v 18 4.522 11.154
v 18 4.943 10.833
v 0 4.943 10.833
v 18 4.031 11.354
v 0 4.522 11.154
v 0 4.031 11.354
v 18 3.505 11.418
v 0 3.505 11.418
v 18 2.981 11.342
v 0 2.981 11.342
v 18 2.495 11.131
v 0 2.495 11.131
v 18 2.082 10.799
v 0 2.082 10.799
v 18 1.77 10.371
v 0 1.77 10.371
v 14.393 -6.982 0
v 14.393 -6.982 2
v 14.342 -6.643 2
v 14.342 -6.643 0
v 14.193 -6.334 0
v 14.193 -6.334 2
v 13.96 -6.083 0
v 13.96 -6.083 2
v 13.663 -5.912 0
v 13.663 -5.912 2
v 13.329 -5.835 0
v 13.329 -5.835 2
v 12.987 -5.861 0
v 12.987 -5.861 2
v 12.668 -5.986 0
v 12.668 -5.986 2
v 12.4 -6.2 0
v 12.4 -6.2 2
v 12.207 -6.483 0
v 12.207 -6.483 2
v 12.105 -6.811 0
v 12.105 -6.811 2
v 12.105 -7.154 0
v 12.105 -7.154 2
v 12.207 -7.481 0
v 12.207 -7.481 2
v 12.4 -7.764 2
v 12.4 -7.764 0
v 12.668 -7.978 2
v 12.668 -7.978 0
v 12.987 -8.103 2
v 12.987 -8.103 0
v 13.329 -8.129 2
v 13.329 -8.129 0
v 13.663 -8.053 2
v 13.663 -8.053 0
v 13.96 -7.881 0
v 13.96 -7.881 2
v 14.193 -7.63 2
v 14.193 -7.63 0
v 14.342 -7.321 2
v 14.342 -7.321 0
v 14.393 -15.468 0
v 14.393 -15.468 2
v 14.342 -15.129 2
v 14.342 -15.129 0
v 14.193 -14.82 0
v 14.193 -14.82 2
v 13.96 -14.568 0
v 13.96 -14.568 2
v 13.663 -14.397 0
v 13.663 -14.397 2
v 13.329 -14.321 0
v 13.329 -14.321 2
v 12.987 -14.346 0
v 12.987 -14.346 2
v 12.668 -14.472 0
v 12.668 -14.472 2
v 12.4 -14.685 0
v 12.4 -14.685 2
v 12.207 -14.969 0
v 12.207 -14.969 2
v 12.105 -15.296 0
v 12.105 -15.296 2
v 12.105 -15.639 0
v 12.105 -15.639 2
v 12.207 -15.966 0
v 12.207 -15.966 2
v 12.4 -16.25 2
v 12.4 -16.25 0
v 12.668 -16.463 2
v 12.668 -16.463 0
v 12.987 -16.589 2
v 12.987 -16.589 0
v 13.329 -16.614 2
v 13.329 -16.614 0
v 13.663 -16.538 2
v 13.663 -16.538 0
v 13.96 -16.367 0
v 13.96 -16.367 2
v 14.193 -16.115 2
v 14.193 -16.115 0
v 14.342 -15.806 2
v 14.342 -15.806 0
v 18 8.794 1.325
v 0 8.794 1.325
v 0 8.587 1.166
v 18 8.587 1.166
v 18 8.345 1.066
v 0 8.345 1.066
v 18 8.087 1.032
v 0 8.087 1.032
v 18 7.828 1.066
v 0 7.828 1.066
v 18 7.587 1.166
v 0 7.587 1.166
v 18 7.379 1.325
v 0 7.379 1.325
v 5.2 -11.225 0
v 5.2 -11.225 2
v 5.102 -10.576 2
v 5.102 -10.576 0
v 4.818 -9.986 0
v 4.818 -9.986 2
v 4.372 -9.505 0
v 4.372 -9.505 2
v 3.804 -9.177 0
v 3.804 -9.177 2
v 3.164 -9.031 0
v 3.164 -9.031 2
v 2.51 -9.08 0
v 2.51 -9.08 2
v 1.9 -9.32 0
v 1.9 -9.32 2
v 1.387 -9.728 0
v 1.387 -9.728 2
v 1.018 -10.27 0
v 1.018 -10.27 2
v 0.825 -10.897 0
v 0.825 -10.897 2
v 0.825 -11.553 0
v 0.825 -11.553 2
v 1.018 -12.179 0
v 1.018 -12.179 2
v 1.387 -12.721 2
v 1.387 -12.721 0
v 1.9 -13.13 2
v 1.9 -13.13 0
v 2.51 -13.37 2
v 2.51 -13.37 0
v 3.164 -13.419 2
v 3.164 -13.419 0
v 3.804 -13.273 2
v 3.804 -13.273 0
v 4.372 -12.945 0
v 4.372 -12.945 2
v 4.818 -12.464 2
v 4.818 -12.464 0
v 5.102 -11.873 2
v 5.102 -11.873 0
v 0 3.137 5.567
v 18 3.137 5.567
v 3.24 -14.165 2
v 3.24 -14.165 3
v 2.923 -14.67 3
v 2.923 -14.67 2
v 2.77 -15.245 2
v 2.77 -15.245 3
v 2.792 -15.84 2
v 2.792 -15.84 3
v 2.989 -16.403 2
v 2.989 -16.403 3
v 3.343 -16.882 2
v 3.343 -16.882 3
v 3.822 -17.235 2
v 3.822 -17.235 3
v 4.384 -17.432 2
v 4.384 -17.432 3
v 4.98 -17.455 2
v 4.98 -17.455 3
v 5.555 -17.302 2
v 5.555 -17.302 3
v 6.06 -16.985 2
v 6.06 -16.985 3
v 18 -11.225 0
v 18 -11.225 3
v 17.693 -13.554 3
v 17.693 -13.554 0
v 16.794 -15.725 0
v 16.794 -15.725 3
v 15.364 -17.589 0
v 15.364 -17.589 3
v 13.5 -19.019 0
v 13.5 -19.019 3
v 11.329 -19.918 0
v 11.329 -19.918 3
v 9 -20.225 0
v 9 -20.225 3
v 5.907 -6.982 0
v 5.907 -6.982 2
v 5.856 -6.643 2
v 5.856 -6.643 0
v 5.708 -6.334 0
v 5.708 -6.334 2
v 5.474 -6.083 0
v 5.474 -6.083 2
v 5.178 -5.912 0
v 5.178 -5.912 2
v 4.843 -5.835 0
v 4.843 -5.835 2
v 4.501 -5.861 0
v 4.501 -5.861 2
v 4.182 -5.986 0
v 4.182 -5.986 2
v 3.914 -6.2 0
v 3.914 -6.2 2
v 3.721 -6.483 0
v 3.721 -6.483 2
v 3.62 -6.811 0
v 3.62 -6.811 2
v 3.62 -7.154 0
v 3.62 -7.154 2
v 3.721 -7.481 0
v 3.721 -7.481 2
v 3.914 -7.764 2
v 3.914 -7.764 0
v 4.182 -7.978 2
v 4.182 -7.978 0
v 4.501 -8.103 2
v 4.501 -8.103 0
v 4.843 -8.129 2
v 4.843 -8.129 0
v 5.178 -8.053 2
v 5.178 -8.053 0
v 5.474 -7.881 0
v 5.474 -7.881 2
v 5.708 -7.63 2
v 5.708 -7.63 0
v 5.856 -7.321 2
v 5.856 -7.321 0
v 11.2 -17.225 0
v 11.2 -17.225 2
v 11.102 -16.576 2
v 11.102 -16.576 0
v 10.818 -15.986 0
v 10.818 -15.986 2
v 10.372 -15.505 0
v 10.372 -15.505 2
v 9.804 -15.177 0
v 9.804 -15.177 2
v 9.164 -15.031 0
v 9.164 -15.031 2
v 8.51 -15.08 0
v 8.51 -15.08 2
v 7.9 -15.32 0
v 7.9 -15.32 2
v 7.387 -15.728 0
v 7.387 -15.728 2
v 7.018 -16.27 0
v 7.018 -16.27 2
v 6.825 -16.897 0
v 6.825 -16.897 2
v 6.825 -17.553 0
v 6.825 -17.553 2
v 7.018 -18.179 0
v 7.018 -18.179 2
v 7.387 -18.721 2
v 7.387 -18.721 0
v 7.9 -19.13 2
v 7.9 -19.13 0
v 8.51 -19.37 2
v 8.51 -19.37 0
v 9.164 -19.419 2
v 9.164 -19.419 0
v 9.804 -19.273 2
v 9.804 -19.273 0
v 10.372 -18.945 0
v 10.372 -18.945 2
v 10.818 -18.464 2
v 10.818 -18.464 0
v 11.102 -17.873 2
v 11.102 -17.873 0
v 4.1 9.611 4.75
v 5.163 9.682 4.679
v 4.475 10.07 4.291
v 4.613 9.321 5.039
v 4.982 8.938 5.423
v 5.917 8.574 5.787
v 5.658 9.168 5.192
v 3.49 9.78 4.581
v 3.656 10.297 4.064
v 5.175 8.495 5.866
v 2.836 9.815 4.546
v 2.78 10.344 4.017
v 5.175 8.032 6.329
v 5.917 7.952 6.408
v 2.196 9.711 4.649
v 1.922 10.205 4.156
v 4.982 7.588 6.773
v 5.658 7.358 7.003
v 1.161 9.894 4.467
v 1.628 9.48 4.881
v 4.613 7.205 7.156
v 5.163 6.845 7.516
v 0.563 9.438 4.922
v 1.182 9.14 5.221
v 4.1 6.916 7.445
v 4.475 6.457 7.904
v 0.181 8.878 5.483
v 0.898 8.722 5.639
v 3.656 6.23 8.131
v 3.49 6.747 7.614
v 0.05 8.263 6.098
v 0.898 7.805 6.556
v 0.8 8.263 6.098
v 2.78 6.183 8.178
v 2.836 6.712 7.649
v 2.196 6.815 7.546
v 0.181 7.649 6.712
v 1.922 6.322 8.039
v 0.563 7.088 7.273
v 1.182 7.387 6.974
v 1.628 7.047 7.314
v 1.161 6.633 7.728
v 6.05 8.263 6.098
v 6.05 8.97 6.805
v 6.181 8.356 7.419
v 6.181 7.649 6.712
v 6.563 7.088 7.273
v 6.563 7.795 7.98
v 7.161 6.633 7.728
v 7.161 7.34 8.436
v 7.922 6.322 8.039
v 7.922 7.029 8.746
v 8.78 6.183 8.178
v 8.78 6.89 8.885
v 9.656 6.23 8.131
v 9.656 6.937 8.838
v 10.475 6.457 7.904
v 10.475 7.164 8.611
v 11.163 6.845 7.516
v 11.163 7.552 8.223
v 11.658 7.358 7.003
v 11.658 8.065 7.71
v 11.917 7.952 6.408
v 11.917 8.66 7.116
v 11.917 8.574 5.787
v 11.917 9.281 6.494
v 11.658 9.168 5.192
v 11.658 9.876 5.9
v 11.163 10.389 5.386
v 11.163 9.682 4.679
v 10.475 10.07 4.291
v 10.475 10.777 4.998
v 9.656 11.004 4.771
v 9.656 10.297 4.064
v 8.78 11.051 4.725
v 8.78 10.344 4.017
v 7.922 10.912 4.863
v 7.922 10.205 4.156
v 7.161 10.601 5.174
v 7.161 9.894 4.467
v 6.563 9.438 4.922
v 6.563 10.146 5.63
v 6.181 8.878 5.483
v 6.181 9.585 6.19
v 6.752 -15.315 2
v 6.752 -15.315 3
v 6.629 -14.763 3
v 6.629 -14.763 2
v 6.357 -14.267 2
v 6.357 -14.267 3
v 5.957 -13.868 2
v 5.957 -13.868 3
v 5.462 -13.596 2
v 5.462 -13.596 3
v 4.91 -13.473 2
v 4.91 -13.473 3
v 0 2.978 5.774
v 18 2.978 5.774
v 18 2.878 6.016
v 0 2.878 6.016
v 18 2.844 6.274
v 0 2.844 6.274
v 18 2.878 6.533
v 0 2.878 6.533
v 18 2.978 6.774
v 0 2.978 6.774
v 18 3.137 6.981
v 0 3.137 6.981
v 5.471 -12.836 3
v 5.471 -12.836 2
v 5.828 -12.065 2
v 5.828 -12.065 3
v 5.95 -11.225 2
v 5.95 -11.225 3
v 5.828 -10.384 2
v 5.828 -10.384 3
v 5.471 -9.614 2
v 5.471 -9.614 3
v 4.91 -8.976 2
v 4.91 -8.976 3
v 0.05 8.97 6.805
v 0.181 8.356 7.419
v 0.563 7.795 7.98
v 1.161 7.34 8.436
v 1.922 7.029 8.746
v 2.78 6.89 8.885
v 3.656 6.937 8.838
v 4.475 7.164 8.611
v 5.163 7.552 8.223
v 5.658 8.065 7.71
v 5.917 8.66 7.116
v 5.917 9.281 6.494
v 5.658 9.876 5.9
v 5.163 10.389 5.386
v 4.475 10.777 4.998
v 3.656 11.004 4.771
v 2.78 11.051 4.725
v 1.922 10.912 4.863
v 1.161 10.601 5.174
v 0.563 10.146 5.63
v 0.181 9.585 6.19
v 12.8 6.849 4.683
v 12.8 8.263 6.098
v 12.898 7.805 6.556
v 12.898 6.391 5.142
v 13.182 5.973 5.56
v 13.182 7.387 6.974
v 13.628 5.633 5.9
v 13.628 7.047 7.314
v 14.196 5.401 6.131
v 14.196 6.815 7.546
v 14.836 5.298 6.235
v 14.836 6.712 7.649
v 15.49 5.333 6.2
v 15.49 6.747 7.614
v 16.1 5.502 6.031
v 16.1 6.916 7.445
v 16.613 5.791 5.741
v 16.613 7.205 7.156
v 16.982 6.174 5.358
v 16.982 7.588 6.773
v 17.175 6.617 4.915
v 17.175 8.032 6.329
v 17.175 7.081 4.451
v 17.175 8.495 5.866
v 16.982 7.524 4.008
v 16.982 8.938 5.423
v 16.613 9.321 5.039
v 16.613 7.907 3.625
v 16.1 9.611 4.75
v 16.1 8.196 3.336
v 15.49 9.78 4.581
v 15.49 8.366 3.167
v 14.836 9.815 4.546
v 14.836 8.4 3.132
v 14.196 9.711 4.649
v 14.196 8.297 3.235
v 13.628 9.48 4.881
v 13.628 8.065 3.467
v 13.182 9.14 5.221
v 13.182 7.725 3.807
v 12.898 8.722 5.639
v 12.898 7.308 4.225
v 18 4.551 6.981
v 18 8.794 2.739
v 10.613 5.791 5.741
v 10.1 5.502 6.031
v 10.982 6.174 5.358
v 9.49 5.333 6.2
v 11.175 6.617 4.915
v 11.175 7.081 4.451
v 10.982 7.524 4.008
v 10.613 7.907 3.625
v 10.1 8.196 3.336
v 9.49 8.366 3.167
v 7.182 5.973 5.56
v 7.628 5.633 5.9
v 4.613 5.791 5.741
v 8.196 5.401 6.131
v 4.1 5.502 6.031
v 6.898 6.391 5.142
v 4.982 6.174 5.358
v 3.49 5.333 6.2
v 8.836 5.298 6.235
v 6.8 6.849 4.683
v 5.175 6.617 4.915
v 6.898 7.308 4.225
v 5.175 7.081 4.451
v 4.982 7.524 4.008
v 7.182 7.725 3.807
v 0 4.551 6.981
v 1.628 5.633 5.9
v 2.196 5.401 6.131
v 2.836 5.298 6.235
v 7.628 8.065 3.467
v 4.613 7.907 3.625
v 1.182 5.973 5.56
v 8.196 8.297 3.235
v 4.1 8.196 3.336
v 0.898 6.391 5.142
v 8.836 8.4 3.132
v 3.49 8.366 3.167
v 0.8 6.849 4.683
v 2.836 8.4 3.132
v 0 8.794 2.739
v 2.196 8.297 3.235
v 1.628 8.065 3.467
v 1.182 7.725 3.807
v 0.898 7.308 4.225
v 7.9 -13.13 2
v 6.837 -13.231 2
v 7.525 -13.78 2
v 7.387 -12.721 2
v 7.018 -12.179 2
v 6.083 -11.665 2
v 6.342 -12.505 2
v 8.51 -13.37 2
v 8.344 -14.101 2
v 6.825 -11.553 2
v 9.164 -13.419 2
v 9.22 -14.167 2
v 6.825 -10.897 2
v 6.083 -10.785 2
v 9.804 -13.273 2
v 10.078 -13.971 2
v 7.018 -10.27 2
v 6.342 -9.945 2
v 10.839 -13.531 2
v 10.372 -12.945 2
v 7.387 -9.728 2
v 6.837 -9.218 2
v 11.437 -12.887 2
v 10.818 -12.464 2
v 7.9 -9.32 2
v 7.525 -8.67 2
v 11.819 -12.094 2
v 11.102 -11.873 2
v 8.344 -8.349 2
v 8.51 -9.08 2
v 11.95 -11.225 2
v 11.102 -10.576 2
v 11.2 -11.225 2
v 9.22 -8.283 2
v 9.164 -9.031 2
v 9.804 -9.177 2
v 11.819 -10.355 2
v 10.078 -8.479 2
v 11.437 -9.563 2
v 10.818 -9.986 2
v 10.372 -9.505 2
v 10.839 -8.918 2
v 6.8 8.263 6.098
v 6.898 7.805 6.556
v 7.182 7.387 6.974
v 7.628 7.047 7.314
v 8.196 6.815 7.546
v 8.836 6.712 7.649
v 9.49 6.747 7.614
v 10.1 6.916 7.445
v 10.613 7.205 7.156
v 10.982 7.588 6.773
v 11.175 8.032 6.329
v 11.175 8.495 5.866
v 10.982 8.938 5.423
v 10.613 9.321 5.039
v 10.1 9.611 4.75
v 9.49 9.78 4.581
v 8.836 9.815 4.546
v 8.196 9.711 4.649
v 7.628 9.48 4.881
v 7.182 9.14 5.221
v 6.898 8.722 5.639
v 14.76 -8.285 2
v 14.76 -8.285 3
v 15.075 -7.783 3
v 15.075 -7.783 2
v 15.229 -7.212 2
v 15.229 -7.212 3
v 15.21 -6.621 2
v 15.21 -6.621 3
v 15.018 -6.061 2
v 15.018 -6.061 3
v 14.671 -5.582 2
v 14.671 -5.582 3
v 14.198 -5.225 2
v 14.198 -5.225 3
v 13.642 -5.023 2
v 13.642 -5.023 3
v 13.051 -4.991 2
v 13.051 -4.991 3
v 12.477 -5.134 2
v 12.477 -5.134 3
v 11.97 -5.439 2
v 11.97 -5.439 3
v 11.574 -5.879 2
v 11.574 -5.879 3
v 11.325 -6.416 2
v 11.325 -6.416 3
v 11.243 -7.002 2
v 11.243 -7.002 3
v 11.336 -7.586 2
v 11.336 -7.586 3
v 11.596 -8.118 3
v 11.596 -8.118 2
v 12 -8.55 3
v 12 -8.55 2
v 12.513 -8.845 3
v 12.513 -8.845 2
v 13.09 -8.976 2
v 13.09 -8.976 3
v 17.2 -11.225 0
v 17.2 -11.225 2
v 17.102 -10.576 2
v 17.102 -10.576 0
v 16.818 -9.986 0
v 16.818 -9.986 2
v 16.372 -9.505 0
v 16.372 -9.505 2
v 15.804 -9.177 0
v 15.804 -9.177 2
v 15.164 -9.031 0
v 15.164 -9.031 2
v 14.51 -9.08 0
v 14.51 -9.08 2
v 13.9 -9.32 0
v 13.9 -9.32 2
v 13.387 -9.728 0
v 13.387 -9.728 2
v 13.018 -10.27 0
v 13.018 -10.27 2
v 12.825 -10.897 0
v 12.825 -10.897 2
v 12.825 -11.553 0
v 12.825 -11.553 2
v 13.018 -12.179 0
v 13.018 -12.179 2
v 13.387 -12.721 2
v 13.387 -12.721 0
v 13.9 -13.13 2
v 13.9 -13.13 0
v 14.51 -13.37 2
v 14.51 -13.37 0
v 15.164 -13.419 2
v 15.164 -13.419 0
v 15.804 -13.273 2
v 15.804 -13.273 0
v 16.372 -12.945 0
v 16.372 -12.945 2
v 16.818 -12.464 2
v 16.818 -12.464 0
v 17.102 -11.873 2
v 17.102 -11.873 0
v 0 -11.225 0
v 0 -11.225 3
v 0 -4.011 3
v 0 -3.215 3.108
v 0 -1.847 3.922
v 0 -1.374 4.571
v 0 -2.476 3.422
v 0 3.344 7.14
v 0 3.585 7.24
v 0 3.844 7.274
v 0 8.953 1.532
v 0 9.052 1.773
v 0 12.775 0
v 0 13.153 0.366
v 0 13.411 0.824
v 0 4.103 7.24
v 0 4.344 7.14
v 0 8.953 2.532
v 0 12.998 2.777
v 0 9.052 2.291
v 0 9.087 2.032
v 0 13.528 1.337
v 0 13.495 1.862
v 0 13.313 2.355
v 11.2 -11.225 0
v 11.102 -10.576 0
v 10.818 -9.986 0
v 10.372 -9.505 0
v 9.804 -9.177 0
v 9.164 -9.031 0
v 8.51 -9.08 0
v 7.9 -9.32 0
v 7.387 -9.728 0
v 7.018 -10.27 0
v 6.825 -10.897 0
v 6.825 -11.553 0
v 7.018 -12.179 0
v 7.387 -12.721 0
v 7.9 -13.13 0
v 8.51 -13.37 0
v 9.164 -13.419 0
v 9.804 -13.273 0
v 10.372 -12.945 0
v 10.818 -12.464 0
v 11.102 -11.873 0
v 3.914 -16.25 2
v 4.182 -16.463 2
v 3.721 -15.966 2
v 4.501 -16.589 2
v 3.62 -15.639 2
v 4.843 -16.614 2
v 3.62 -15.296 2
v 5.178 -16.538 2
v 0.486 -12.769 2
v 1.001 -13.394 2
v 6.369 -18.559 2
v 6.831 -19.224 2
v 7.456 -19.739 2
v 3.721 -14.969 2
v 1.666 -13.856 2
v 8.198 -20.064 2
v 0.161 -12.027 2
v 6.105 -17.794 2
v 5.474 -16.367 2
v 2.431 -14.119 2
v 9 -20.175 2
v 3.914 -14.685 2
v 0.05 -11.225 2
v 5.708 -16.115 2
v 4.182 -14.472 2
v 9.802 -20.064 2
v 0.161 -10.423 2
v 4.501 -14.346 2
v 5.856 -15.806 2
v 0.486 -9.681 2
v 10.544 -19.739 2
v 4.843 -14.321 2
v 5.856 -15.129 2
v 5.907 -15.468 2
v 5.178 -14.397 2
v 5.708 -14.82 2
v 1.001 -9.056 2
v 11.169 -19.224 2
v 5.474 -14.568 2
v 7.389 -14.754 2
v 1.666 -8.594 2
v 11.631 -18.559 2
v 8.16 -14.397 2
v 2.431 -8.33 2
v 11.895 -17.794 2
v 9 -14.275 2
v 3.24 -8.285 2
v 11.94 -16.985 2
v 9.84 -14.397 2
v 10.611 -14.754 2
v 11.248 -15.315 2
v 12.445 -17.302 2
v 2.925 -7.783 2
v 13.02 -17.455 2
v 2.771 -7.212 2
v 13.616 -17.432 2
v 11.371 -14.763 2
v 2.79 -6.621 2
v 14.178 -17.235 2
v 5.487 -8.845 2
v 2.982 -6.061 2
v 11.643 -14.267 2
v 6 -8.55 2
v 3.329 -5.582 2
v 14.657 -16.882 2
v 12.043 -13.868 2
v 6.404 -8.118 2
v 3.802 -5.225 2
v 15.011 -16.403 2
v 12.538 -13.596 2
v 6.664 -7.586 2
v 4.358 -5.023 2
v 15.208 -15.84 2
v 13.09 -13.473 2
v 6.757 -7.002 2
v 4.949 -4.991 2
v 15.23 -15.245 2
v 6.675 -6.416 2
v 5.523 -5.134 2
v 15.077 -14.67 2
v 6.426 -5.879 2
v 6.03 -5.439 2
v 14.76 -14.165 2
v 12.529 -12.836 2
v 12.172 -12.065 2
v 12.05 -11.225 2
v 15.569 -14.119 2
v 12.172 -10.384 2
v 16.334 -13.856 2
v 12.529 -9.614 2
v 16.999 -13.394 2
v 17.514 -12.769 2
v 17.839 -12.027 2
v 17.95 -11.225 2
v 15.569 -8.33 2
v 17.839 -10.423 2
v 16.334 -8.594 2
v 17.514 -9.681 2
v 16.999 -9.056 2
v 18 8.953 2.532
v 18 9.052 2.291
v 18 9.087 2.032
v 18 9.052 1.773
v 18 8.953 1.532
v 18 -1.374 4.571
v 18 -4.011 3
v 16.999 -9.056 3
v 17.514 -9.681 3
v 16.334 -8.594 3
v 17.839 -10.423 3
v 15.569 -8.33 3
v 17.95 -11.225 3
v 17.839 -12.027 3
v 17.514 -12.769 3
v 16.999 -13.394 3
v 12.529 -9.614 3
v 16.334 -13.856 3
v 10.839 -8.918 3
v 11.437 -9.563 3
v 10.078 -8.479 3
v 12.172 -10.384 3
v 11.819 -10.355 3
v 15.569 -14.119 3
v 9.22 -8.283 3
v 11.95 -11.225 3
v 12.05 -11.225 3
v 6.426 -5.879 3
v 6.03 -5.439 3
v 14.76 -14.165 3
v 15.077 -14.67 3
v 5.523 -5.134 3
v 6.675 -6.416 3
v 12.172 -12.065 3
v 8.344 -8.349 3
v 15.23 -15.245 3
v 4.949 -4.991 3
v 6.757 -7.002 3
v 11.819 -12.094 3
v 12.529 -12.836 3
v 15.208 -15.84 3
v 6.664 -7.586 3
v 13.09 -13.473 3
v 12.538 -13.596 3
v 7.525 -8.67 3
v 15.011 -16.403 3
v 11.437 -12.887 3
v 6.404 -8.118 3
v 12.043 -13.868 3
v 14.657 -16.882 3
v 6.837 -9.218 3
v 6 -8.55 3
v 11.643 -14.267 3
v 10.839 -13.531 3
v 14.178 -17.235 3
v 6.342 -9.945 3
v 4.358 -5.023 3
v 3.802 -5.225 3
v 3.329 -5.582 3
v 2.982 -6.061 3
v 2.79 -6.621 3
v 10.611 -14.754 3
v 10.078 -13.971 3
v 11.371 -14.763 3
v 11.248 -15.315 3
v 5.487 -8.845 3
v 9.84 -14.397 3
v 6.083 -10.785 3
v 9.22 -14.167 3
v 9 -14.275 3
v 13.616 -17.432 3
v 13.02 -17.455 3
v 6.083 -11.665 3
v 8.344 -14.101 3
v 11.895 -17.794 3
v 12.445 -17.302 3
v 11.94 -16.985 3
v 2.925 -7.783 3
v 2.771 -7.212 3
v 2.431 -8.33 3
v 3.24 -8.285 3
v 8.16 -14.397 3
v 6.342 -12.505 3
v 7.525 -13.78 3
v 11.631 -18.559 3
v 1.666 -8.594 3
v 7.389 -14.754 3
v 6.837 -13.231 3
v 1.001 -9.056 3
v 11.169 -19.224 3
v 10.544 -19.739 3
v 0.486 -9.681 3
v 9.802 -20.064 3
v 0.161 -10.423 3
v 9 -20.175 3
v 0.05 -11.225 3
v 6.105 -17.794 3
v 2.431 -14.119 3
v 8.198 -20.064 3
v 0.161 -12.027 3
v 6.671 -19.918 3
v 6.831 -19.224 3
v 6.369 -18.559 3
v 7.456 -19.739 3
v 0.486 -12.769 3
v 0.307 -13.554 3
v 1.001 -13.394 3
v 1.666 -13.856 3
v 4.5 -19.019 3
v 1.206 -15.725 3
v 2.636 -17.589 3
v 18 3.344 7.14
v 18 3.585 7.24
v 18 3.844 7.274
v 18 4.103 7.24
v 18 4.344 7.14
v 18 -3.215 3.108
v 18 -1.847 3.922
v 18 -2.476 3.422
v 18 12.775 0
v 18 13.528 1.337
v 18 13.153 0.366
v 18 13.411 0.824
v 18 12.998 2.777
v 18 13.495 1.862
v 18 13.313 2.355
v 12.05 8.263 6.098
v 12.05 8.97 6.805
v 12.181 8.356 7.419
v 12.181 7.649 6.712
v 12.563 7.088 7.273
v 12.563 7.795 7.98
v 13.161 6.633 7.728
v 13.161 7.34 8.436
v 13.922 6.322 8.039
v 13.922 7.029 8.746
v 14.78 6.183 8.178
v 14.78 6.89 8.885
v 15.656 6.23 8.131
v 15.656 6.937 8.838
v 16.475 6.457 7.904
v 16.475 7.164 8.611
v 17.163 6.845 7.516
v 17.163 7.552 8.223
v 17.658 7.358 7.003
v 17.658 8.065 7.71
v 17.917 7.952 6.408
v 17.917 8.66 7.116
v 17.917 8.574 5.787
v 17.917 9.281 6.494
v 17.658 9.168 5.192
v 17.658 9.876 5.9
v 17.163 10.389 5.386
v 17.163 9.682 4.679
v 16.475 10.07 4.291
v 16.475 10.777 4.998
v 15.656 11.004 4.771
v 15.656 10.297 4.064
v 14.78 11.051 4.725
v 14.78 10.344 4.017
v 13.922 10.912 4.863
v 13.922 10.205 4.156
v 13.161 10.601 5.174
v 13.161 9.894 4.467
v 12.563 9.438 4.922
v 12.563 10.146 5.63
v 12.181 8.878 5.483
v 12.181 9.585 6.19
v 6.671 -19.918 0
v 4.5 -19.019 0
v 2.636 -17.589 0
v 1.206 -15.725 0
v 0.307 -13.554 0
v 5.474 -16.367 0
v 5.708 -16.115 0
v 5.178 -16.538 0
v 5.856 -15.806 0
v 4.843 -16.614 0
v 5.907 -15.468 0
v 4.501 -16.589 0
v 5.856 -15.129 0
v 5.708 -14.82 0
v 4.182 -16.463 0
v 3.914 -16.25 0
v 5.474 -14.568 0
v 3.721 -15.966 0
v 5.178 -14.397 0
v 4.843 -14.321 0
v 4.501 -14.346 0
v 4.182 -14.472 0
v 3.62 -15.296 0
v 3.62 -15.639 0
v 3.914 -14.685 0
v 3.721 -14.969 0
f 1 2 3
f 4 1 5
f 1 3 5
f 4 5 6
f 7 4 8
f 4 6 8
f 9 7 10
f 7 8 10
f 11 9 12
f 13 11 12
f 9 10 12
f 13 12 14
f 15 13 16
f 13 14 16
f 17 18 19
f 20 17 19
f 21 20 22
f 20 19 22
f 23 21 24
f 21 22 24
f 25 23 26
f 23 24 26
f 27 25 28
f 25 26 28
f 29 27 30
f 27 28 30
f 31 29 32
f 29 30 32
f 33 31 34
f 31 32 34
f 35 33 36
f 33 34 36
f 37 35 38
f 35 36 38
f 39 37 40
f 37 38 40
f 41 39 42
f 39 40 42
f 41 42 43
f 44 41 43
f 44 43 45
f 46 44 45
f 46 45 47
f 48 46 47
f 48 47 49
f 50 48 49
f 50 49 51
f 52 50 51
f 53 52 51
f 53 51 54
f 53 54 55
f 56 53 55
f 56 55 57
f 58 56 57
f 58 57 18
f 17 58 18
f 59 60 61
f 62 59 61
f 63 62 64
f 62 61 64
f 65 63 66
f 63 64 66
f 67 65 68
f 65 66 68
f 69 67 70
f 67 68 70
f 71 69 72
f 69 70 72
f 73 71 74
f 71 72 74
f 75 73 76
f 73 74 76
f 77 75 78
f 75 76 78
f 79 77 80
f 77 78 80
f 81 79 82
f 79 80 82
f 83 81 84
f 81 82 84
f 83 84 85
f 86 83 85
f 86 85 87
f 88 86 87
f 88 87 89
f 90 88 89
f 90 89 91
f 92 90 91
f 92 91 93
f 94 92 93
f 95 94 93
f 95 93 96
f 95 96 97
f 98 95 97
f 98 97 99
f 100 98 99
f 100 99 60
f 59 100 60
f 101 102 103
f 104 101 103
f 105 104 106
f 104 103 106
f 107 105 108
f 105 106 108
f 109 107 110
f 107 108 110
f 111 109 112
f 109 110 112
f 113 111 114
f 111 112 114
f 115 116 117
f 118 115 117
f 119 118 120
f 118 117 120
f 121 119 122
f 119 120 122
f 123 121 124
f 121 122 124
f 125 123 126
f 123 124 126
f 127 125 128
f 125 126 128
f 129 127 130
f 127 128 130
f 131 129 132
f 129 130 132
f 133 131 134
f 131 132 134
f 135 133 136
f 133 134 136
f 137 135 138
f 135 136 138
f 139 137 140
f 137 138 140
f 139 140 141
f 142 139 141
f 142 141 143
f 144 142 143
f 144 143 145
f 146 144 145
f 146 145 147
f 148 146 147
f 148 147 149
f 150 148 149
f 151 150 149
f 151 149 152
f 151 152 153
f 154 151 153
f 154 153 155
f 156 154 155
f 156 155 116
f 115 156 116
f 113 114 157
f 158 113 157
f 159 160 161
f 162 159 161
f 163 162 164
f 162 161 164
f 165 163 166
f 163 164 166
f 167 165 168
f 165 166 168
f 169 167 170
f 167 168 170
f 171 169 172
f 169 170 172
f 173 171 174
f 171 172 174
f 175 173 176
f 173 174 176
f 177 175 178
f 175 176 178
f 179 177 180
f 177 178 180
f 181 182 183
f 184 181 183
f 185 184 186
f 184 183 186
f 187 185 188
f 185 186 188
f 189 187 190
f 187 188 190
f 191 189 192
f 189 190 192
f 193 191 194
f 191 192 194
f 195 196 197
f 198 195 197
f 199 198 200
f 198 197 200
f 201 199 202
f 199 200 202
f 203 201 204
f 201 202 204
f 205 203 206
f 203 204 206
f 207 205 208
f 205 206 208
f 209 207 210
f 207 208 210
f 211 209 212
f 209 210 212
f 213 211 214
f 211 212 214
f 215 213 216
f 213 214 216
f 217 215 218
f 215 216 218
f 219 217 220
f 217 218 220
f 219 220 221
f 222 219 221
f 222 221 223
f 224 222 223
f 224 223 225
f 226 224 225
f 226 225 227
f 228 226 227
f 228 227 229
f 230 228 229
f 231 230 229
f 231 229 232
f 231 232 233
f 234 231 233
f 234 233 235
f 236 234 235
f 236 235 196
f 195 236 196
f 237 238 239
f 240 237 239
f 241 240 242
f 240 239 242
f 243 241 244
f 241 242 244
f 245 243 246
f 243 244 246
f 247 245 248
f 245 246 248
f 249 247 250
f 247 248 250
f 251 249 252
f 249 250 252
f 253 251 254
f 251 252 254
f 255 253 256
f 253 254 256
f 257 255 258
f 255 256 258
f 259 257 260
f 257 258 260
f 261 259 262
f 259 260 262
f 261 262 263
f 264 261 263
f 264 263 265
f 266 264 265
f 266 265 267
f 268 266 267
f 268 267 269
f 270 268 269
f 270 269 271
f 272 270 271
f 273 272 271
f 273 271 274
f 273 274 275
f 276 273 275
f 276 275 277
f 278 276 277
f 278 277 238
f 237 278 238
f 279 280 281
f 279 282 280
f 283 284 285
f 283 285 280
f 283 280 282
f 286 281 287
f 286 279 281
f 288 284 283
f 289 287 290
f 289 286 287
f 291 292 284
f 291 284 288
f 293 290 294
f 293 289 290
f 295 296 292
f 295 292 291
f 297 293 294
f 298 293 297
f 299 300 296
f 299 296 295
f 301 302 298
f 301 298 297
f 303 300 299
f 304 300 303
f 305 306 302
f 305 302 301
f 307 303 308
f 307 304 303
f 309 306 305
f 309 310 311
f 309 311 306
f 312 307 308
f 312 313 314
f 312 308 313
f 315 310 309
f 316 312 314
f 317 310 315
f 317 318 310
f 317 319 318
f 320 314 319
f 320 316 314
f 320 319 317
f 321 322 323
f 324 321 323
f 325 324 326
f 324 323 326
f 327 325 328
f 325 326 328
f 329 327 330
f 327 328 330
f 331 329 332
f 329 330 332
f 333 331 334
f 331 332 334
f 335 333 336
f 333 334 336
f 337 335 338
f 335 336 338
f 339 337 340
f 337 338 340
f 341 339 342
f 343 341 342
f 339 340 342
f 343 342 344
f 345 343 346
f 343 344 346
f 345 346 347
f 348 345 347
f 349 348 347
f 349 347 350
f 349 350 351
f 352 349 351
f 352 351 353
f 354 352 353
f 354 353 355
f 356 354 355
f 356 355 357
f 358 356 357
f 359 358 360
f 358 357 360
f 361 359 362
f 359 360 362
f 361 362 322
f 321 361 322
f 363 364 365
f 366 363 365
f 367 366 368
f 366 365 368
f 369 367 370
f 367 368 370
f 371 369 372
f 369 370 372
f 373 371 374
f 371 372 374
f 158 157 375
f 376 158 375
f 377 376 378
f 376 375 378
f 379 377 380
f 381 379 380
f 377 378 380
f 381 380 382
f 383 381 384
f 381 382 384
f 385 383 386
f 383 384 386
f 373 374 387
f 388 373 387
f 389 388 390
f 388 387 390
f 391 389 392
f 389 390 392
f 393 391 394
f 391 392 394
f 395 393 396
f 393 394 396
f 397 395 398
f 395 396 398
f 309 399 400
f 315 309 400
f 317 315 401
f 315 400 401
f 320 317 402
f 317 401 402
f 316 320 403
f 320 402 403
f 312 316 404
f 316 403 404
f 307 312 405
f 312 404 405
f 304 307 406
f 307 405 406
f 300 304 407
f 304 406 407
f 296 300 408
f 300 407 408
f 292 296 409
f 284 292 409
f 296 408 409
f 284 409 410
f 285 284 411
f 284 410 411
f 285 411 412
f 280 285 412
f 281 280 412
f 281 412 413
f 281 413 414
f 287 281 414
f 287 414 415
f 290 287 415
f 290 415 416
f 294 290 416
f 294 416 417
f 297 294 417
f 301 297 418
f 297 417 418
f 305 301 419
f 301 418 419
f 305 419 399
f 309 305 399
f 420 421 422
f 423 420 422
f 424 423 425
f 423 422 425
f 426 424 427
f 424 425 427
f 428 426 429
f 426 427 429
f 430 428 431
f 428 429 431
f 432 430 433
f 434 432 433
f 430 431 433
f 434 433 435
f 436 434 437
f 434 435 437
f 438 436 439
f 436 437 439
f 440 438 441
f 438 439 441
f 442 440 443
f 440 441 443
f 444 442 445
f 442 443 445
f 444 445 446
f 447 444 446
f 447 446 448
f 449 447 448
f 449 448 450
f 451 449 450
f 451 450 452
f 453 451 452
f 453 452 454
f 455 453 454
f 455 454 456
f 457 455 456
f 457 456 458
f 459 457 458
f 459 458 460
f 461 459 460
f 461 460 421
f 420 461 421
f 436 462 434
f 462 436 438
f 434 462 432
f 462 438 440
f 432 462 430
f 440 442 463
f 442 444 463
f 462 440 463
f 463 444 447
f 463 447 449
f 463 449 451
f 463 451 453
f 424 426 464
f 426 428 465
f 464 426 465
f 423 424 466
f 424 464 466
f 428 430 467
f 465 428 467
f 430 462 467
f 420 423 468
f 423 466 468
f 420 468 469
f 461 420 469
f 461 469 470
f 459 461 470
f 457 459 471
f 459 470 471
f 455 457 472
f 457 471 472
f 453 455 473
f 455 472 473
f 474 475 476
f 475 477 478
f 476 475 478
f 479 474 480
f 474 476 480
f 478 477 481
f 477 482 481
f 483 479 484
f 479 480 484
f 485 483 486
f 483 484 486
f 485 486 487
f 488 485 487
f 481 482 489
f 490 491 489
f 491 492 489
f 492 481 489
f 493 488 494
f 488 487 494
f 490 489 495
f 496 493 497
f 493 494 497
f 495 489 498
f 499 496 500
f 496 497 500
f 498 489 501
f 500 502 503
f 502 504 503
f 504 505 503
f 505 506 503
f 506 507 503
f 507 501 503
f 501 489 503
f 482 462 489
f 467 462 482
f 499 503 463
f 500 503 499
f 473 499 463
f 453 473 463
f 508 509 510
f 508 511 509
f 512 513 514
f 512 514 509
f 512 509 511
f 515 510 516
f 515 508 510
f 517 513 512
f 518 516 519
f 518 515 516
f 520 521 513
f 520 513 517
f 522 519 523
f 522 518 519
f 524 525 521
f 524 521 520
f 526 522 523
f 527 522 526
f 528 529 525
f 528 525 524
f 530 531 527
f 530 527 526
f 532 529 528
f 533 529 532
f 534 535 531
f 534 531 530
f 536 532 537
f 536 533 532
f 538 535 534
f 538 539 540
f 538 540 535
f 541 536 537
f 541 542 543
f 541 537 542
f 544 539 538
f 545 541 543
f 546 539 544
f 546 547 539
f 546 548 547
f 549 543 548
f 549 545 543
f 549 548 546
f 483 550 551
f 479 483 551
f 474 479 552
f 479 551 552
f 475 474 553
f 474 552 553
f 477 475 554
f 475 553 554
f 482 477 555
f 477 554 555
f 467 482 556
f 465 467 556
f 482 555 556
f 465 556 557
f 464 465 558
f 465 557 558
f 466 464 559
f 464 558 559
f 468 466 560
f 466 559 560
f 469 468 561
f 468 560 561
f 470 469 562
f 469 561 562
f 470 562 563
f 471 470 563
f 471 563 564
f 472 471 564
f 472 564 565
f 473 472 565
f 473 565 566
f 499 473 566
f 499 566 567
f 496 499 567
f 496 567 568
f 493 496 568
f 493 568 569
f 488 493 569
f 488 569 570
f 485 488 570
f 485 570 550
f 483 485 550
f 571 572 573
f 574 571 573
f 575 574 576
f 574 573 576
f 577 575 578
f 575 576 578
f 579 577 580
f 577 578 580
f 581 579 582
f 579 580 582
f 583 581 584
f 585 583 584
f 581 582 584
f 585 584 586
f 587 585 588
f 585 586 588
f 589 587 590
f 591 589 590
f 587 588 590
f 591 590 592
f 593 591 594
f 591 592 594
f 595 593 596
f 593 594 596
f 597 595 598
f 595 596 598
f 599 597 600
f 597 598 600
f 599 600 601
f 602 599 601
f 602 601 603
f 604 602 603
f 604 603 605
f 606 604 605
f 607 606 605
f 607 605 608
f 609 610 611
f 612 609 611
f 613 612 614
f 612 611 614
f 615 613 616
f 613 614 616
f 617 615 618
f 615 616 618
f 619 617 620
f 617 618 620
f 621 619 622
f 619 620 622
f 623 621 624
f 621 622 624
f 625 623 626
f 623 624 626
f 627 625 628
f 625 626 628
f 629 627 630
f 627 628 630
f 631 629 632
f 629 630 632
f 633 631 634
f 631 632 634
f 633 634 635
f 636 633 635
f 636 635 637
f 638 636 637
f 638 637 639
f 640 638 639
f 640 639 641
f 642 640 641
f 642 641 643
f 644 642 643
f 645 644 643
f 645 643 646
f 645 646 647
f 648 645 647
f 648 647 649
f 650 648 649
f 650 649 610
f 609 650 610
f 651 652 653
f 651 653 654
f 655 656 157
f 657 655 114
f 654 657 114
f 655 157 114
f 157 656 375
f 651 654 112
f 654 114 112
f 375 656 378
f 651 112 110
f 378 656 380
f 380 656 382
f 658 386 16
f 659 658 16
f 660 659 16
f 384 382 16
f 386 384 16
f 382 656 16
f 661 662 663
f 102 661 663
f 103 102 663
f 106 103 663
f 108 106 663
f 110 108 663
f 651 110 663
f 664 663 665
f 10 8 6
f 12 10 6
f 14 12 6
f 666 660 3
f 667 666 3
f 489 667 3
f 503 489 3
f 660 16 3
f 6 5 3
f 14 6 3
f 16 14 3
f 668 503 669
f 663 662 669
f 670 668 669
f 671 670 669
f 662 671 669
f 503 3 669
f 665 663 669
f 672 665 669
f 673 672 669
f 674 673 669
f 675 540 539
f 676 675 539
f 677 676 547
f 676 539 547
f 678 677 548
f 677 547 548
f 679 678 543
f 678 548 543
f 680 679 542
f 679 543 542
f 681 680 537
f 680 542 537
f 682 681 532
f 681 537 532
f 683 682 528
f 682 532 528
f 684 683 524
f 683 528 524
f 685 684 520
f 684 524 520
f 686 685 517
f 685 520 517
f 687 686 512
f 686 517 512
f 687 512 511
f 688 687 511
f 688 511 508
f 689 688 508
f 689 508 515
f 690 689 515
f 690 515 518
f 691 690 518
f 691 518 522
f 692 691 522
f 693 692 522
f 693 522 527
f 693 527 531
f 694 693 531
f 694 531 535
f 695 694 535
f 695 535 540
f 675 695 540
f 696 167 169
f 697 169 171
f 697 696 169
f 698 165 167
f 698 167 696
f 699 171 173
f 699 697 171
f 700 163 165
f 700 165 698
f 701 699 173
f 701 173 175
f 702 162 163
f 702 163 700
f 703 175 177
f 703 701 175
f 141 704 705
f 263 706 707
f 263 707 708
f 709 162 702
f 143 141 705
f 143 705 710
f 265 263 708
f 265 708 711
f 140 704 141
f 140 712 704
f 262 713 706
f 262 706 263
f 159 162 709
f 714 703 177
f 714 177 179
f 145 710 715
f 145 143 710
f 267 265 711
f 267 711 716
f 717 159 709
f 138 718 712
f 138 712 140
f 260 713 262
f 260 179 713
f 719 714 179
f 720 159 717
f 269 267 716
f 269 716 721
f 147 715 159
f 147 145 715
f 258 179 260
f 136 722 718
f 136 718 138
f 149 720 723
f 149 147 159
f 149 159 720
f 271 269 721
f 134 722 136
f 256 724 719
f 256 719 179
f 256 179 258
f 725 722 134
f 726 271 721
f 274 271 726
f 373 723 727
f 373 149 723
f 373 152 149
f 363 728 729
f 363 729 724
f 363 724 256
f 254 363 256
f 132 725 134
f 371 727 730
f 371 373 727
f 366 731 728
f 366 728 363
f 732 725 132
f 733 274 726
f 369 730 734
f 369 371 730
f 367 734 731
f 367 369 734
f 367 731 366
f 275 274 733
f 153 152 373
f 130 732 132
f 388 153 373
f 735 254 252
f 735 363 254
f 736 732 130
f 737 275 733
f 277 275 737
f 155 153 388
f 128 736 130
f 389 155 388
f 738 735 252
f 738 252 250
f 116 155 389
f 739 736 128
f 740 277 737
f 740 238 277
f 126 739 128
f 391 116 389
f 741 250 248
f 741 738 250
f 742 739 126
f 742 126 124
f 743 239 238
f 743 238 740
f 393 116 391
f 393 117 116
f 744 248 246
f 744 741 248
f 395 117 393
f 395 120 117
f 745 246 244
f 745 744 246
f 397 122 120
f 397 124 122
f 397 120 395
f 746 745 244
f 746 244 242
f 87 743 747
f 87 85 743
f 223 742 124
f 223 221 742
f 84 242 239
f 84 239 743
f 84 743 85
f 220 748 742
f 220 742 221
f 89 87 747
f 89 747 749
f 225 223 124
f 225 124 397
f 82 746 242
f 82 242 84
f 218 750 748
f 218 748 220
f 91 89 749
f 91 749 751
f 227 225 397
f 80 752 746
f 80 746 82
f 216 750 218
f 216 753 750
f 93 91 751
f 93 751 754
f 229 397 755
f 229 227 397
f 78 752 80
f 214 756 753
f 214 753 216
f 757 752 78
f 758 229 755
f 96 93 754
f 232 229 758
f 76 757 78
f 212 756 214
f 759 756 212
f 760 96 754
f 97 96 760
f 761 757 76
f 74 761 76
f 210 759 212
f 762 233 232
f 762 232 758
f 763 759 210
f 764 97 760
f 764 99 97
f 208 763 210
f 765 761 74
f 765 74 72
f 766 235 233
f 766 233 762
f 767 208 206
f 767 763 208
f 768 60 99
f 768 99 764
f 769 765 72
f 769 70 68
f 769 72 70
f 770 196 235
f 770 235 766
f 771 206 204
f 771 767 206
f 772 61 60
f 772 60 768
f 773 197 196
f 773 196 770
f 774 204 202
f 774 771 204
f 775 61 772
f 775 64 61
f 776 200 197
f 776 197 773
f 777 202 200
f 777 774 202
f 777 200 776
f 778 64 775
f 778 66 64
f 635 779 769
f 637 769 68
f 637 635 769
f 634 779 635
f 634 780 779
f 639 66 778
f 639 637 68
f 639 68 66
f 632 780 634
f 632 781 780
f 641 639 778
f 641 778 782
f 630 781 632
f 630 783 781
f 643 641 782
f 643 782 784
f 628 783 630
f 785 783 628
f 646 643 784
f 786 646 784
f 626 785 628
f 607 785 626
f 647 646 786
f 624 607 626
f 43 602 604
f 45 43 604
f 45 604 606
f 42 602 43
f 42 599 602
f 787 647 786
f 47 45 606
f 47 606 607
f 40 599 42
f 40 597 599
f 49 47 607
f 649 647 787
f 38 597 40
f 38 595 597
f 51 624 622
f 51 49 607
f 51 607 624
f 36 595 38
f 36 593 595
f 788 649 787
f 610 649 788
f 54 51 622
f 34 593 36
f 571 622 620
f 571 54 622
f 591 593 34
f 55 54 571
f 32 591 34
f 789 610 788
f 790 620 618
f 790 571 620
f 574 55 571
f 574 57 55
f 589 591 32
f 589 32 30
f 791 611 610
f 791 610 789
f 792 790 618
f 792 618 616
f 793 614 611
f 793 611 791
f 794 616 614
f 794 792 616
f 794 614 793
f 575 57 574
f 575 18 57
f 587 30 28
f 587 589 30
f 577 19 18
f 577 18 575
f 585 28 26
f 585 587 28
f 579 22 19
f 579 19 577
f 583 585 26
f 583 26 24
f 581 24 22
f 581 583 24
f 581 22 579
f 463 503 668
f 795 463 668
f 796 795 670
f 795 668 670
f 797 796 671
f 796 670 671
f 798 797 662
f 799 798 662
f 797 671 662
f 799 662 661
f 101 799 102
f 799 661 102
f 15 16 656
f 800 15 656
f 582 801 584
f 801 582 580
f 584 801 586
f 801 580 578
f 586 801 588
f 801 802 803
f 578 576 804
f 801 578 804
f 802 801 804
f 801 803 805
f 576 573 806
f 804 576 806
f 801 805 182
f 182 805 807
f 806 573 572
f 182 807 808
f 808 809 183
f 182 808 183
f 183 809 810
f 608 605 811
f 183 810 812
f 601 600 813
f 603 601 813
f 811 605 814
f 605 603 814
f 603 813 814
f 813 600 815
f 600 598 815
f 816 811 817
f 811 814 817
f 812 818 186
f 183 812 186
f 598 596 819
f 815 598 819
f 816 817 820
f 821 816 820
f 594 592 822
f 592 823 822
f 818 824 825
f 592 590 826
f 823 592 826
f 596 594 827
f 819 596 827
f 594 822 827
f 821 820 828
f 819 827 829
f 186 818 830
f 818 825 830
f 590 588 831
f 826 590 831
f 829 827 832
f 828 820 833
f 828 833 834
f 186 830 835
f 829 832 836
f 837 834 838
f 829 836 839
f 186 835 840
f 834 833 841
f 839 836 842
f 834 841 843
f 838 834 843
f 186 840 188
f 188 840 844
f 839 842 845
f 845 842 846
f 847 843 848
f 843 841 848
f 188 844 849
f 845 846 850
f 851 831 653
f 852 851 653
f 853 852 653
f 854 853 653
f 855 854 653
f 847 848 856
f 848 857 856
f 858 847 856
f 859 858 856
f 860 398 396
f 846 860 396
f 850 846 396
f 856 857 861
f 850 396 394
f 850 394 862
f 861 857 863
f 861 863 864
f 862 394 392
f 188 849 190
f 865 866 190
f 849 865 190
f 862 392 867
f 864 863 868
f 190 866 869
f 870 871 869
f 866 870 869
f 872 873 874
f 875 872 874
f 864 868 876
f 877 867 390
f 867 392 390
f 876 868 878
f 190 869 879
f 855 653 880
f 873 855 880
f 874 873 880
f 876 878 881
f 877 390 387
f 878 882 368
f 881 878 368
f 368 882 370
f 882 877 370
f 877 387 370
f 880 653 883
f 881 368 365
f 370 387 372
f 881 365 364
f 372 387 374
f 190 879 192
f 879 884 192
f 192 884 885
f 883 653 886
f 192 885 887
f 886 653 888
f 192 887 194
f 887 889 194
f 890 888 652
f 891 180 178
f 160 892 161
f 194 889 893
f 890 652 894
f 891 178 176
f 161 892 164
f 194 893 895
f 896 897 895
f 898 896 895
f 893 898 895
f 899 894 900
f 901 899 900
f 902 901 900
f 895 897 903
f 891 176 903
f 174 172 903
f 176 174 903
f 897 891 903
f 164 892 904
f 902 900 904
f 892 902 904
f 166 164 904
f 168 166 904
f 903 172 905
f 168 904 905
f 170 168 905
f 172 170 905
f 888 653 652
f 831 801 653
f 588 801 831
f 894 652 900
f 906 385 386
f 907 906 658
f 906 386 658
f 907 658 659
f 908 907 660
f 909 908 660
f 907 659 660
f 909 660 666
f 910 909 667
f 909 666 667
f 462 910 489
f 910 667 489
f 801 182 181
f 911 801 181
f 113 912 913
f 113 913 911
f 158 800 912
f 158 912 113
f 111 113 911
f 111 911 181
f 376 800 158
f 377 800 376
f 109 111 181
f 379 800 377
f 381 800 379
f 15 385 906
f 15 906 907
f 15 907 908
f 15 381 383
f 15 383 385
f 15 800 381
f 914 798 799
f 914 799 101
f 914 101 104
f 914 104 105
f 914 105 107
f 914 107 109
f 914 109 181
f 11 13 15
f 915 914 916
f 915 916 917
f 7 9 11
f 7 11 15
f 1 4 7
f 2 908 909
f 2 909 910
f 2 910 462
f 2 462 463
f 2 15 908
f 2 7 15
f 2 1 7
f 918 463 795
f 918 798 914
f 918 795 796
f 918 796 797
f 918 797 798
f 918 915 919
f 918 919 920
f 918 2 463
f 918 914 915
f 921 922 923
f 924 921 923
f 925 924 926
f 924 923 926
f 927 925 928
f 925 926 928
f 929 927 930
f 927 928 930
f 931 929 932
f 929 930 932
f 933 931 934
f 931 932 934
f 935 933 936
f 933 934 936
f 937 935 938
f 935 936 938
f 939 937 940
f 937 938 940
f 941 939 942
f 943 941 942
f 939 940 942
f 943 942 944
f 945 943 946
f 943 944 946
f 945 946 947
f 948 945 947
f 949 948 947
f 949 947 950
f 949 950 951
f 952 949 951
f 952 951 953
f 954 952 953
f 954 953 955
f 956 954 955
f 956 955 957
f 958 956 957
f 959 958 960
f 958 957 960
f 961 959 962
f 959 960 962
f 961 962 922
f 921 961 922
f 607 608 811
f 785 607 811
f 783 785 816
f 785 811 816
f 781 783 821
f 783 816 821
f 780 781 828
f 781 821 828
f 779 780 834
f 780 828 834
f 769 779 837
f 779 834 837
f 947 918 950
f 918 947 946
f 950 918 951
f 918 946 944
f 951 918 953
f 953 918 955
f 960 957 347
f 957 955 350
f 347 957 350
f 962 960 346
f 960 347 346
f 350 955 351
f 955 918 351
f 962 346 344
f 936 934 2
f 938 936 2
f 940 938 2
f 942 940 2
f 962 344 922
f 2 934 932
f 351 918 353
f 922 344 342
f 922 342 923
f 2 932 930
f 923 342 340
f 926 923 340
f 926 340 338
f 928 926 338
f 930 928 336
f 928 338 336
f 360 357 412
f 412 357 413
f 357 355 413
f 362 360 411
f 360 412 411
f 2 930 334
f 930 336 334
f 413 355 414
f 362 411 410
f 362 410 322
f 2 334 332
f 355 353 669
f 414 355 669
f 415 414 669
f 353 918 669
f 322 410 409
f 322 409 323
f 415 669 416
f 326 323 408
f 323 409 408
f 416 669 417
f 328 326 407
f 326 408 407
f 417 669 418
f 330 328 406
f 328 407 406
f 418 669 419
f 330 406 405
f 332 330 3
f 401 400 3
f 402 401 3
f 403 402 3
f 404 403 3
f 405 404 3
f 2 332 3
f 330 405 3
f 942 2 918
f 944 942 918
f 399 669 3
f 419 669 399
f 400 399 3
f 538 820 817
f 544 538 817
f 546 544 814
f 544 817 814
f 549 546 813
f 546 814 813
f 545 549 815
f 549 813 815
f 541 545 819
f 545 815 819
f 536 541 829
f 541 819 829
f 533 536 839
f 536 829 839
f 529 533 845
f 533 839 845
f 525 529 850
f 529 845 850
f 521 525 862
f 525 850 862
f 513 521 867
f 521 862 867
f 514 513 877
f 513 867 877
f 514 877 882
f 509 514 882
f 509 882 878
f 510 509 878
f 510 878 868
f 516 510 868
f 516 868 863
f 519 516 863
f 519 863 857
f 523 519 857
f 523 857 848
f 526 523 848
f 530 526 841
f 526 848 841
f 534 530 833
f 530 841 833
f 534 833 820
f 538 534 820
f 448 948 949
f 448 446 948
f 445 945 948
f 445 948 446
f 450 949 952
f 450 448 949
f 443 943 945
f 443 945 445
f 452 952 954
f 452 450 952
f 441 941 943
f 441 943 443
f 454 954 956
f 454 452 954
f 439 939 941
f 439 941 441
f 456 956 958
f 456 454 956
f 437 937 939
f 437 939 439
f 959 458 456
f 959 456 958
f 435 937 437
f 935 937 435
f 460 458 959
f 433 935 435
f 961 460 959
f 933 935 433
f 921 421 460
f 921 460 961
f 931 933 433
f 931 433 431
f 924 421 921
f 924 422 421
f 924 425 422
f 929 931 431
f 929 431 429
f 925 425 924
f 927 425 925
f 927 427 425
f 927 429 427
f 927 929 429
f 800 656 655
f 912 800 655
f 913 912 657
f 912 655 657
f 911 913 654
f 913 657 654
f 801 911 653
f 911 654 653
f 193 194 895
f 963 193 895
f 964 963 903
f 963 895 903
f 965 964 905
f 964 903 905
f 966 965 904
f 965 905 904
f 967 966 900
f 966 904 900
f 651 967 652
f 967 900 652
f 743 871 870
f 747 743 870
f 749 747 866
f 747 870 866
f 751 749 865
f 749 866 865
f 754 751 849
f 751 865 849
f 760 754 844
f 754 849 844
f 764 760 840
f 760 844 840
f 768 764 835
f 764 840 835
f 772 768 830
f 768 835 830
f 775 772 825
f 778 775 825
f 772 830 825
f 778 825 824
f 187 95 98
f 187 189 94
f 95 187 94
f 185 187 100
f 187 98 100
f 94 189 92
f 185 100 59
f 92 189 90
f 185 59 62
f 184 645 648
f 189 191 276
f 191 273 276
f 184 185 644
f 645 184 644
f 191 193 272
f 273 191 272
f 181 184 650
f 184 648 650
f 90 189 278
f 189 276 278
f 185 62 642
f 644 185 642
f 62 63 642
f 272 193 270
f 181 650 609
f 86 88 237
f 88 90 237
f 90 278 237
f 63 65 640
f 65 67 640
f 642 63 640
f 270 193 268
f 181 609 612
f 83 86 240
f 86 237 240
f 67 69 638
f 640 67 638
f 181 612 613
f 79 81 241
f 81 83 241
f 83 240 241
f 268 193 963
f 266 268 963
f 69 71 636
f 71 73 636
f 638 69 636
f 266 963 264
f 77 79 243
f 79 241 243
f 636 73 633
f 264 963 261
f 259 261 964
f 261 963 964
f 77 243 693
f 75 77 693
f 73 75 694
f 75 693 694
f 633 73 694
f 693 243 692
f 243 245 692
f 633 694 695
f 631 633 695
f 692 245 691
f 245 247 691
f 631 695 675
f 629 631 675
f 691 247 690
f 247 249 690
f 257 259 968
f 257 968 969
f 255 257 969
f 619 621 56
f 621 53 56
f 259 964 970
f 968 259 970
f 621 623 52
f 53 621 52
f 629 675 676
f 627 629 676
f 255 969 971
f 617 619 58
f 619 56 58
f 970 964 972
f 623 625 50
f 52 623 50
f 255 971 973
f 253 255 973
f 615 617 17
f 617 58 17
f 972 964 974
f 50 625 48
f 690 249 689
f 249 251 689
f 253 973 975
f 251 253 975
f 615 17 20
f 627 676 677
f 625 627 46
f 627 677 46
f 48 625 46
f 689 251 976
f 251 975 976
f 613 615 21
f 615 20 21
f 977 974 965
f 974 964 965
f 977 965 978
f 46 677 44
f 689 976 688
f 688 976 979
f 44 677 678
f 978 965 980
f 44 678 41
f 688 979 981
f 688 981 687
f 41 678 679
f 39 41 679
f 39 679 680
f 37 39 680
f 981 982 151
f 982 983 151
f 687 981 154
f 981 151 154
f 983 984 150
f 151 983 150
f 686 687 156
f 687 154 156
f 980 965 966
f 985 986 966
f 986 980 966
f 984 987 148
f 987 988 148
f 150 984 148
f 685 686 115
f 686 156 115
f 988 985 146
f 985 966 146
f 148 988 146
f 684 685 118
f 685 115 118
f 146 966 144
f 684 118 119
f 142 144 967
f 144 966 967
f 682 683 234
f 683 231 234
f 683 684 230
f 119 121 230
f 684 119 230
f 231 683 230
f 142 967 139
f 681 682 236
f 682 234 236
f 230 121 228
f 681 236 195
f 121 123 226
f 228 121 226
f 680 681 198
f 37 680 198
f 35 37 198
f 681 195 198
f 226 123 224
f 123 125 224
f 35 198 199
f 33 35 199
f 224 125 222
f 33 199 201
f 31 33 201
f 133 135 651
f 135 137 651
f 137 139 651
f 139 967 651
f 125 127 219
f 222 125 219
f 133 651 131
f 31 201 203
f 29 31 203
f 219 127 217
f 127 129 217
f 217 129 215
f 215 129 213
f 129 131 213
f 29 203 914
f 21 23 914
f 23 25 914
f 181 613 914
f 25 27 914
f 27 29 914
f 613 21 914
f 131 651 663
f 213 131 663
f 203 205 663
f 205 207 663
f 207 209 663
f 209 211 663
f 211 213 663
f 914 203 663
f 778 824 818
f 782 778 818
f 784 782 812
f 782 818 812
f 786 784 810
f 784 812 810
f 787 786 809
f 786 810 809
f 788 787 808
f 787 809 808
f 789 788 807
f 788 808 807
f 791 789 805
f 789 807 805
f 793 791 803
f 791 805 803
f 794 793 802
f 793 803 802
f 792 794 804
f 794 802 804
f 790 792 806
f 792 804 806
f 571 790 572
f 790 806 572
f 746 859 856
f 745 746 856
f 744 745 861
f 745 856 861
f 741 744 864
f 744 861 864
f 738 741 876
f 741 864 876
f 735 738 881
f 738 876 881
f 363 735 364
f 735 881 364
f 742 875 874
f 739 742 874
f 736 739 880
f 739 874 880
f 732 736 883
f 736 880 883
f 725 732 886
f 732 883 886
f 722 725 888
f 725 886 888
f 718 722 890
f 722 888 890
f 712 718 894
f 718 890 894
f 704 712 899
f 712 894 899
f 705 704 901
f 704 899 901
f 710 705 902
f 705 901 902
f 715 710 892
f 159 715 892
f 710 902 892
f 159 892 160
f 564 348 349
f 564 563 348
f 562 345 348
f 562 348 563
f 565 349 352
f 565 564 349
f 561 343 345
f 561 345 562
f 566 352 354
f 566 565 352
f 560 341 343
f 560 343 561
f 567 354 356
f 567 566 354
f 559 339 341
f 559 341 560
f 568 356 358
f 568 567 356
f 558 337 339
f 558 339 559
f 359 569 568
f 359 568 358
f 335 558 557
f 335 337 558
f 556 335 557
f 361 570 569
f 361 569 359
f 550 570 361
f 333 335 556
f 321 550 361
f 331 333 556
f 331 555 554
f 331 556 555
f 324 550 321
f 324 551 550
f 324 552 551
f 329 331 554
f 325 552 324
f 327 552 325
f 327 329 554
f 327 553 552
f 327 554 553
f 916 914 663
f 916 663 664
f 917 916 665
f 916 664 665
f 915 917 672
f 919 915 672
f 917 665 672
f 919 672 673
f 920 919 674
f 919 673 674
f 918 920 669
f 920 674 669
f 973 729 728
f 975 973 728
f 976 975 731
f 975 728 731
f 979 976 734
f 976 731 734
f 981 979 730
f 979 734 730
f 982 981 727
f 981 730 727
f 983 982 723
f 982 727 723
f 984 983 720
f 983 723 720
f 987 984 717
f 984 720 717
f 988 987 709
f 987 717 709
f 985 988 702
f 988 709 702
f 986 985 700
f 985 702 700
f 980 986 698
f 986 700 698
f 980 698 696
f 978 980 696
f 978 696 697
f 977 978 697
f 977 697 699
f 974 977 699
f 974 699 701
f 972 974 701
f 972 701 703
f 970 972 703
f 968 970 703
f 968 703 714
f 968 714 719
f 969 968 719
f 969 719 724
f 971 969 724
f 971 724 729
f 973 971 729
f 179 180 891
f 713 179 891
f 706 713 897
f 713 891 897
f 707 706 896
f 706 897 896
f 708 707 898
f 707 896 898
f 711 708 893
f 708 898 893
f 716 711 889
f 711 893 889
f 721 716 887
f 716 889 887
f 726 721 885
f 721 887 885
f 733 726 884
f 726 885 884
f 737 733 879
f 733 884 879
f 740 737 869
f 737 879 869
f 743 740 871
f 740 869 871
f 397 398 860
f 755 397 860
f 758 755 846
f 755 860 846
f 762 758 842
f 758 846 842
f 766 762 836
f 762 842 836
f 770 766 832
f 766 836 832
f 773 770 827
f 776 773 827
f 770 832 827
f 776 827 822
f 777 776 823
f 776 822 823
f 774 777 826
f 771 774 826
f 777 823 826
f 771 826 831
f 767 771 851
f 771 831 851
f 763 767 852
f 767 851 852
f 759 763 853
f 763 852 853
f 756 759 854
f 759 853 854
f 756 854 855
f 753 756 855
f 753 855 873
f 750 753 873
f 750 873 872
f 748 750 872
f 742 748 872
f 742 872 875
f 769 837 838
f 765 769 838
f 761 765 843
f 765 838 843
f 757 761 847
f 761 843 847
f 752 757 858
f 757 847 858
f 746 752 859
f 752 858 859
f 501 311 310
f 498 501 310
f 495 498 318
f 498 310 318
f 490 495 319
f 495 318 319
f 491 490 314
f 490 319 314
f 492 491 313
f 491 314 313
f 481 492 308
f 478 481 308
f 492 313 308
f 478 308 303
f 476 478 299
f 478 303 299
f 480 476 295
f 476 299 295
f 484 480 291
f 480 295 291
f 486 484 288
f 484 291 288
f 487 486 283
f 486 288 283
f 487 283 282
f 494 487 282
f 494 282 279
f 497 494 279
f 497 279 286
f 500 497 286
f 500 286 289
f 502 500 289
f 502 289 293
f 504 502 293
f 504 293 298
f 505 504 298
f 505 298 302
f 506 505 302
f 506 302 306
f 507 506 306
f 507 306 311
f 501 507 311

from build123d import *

# Parameters (mm, degrees)
F1_DEPTH = 18
F2_R     = 2.2
F2_R_2   = 1.15
F3_DEPTH = 3.001
F2_R_3   = 2.95
F4_DEPTH = 1
F5_R     = 2.2
F6_DEPTH = 3
F5_R_2   = 2.95
F7_DEPTH = 1


with BuildPart() as f1:
    # F0 (on Right) → F1 (new body)
    with BuildSketch(Plane.YZ):
        with BuildLine():
            Line((-20.2248597033, 3), (-20.2248597033, 0))
            Line((-20.2248597033, 0), (12.7751402967, 0))
            ThreePointArc((12.7751402967, 0), (13.5282296336, 1.3368087613), (12.9983799607, 2.776760336))
            Line((12.9983799607, 2.776760336), (4.9426106974, 10.8325295992))
            ThreePointArc((4.9426106974, 10.8325295992), (3.2406453095, 11.3975075099), (1.7700242043, 10.3712717737))
            Line((1.7700242043, 10.3712717737), (-1.373686309, 4.5705663947))
            ThreePointArc((-1.373686309, 4.5705663947), (-2.4763679927, 3.4223750451), (-4.0112457051, 3))
            Line((-4.0112457051, 3), (-20.2248597033, 3))
        make_face()
        with BuildLine():
            Line((4.5510043656, 6.9814952439), (8.7936450527, 2.7388545568))
            ThreePointArc((8.7936450527, 2.7388545568), (9.0865382716, 2.0317477756), (8.7936450527, 1.3246409944))
            ThreePointArc((8.7936450527, 1.3246409944), (8.0865382716, 1.0317477756), (7.3794314904, 1.3246409944))
            Line((7.3794314904, 1.3246409944), (3.1367908032, 5.5672816816))
            ThreePointArc((3.1367908032, 5.5672816816), (2.8438975844, 6.2743884627), (3.1367908032, 6.9814952439))
            ThreePointArc((3.1367908032, 6.9814952439), (3.8438975844, 7.2743884627), (4.5510043656, 6.9814952439))
        make_face(mode=Mode.SUBTRACT)
    extrude(amount=F1_DEPTH)

    # F2 (on face) → F3 (cut, through all)
    with BuildSketch(Plane.XY.offset(3)):
        with Locations((9, -11.2248597033)):
            Circle(F2_R)
        with Locations((3, -11.2248597033)):
            Circle(F2_R)
        with Locations((4.7573593129, -6.9822190162)):
            Circle(F2_R_2)
        with Locations((4.7573593129, -15.4675003905)):
            Circle(F2_R_2)
        with Locations((9, -17.2248597033)):
            Circle(F2_R)
        with Locations((13.2426406871, -15.4675003905)):
            Circle(F2_R_2)
        with Locations((15, -11.2248597033)):
            Circle(F2_R)
        with Locations((13.2426406871, -6.9822190162)):
            Circle(F2_R_2)
        with BuildLine():
            ThreePointArc((9, -20.2248597033), (2.6360389693, -17.588820734), (0, -11.2248597033))
            Line((0, -11.2248597033), (0, -20.2248597033))
            Line((0, -20.2248597033), (9, -20.2248597033))
        make_face()
        with BuildLine():
            ThreePointArc((18, -11.2248597033), (15.3639610307, -17.588820734), (9, -20.2248597033))
            Line((9, -20.2248597033), (18, -20.2248597033))
            Line((18, -20.2248597033), (18, -11.2248597033))
        make_face()
    extrude(amount=-F3_DEPTH, mode=Mode.SUBTRACT)

    # F2 (on face) → F4 (cut)
    with BuildSketch(Plane.XY.offset(3)):
        with BuildLine():
            ThreePointArc((4.9097033132, -8.9764084018), (5.5227261776, -5.1344599512), (3.2395309996, -8.284600378))
            ThreePointArc((3.2395309996, -8.284600378), (0.05, -11.2248597033), (3.2395309996, -14.1651190287))
            ThreePointArc((3.2395309996, -14.1651190287), (3.3431457505, -16.8817139528), (6.0597406747, -16.9853287037))
            ThreePointArc((6.0597406747, -16.9853287037), (9, -20.1748597033), (11.9402593253, -16.9853287037))
            ThreePointArc((11.9402593253, -16.9853287037), (14.6568542495, -16.8817139528), (14.7604690004, -14.1651190287))
            ThreePointArc((14.7604690004, -14.1651190287), (17.95, -11.2248597033), (14.7604690004, -8.284600378))
            ThreePointArc((14.7604690004, -8.284600378), (12.4772738224, -5.1344599512), (13.0902966868, -8.9764084018))
            ThreePointArc((13.0902966868, -8.9764084018), (12.05, -11.2248597033), (13.0902966868, -13.4733110049))
            ThreePointArc((13.0902966868, -13.4733110049), (11.8284271247, -14.0532868281), (11.2484513015, -15.3151563901))
            ThreePointArc((11.2484513015, -15.3151563901), (9, -14.2748597033), (6.7515486985, -15.3151563901))
            ThreePointArc((6.7515486985, -15.3151563901), (6.1715728753, -14.0532868281), (4.9097033132, -13.4733110049))
            ThreePointArc((4.9097033132, -13.4733110049), (5.95, -11.2248597033), (4.9097033132, -8.9764084018))
        make_face()
        with Locations((4.7573593129, -15.4675003905)):
            Circle(F2_R_2, mode=Mode.SUBTRACT)
        with Locations((9, -17.2248597033)):
            Circle(F2_R, mode=Mode.SUBTRACT)
        with Locations((13.2426406871, -15.4675003905)):
            Circle(F2_R_2, mode=Mode.SUBTRACT)
        with Locations((3, -11.2248597033)):
            Circle(F2_R, mode=Mode.SUBTRACT)
        with Locations((4.7573593129, -6.9822190162)):
            Circle(F2_R_2, mode=Mode.SUBTRACT)
        with Locations((15, -11.2248597033)):
            Circle(F2_R, mode=Mode.SUBTRACT)
        with Locations((13.2426406871, -6.9822190162)):
            Circle(F2_R_2, mode=Mode.SUBTRACT)
        with Locations((9, -11.2248597033)):
            Circle(F2_R_3)
        with Locations((9, -11.2248597033)):
            Circle(F2_R, mode=Mode.SUBTRACT)
    extrude(amount=-F4_DEPTH, mode=Mode.SUBTRACT)

    # F5 (on face) → F6 (cut, through all)
    with BuildSketch(Plane(origin=(0, 7.8875701483, 7.8875701483), x_dir=(-1, 0, 0), z_dir=(0, 0.7071067812, 0.7071067812))):
        with Locations((-15, -1.5314874776)):
            Circle(F5_R)
        with Locations((-9, -1.5314874776)):
            Circle(F5_R)
        with Locations((-3, -1.5314874776)):
            Circle(F5_R)
    extrude(amount=-F6_DEPTH, mode=Mode.SUBTRACT)

    # F5 (on face) → F7 (cut)
    with BuildSketch(Plane(origin=(0, 7.8875701483, 7.8875701483), x_dir=(-1, 0, 0), z_dir=(0, 0.7071067812, 0.7071067812))):
        with Locations((-15, -1.5314874776)):
            Circle(F5_R_2)
        with Locations((-15, -1.5314874776)):
            Circle(F5_R, mode=Mode.SUBTRACT)
        with Locations((-9, -1.5314874776)):
            Circle(F5_R_2)
        with Locations((-9, -1.5314874776)):
            Circle(F5_R, mode=Mode.SUBTRACT)
        with Locations((-3, -1.5314874776)):
            Circle(F5_R_2)
        with Locations((-3, -1.5314874776)):
            Circle(F5_R, mode=Mode.SUBTRACT)
    extrude(amount=-F7_DEPTH, mode=Mode.SUBTRACT)


solid = f1.part
